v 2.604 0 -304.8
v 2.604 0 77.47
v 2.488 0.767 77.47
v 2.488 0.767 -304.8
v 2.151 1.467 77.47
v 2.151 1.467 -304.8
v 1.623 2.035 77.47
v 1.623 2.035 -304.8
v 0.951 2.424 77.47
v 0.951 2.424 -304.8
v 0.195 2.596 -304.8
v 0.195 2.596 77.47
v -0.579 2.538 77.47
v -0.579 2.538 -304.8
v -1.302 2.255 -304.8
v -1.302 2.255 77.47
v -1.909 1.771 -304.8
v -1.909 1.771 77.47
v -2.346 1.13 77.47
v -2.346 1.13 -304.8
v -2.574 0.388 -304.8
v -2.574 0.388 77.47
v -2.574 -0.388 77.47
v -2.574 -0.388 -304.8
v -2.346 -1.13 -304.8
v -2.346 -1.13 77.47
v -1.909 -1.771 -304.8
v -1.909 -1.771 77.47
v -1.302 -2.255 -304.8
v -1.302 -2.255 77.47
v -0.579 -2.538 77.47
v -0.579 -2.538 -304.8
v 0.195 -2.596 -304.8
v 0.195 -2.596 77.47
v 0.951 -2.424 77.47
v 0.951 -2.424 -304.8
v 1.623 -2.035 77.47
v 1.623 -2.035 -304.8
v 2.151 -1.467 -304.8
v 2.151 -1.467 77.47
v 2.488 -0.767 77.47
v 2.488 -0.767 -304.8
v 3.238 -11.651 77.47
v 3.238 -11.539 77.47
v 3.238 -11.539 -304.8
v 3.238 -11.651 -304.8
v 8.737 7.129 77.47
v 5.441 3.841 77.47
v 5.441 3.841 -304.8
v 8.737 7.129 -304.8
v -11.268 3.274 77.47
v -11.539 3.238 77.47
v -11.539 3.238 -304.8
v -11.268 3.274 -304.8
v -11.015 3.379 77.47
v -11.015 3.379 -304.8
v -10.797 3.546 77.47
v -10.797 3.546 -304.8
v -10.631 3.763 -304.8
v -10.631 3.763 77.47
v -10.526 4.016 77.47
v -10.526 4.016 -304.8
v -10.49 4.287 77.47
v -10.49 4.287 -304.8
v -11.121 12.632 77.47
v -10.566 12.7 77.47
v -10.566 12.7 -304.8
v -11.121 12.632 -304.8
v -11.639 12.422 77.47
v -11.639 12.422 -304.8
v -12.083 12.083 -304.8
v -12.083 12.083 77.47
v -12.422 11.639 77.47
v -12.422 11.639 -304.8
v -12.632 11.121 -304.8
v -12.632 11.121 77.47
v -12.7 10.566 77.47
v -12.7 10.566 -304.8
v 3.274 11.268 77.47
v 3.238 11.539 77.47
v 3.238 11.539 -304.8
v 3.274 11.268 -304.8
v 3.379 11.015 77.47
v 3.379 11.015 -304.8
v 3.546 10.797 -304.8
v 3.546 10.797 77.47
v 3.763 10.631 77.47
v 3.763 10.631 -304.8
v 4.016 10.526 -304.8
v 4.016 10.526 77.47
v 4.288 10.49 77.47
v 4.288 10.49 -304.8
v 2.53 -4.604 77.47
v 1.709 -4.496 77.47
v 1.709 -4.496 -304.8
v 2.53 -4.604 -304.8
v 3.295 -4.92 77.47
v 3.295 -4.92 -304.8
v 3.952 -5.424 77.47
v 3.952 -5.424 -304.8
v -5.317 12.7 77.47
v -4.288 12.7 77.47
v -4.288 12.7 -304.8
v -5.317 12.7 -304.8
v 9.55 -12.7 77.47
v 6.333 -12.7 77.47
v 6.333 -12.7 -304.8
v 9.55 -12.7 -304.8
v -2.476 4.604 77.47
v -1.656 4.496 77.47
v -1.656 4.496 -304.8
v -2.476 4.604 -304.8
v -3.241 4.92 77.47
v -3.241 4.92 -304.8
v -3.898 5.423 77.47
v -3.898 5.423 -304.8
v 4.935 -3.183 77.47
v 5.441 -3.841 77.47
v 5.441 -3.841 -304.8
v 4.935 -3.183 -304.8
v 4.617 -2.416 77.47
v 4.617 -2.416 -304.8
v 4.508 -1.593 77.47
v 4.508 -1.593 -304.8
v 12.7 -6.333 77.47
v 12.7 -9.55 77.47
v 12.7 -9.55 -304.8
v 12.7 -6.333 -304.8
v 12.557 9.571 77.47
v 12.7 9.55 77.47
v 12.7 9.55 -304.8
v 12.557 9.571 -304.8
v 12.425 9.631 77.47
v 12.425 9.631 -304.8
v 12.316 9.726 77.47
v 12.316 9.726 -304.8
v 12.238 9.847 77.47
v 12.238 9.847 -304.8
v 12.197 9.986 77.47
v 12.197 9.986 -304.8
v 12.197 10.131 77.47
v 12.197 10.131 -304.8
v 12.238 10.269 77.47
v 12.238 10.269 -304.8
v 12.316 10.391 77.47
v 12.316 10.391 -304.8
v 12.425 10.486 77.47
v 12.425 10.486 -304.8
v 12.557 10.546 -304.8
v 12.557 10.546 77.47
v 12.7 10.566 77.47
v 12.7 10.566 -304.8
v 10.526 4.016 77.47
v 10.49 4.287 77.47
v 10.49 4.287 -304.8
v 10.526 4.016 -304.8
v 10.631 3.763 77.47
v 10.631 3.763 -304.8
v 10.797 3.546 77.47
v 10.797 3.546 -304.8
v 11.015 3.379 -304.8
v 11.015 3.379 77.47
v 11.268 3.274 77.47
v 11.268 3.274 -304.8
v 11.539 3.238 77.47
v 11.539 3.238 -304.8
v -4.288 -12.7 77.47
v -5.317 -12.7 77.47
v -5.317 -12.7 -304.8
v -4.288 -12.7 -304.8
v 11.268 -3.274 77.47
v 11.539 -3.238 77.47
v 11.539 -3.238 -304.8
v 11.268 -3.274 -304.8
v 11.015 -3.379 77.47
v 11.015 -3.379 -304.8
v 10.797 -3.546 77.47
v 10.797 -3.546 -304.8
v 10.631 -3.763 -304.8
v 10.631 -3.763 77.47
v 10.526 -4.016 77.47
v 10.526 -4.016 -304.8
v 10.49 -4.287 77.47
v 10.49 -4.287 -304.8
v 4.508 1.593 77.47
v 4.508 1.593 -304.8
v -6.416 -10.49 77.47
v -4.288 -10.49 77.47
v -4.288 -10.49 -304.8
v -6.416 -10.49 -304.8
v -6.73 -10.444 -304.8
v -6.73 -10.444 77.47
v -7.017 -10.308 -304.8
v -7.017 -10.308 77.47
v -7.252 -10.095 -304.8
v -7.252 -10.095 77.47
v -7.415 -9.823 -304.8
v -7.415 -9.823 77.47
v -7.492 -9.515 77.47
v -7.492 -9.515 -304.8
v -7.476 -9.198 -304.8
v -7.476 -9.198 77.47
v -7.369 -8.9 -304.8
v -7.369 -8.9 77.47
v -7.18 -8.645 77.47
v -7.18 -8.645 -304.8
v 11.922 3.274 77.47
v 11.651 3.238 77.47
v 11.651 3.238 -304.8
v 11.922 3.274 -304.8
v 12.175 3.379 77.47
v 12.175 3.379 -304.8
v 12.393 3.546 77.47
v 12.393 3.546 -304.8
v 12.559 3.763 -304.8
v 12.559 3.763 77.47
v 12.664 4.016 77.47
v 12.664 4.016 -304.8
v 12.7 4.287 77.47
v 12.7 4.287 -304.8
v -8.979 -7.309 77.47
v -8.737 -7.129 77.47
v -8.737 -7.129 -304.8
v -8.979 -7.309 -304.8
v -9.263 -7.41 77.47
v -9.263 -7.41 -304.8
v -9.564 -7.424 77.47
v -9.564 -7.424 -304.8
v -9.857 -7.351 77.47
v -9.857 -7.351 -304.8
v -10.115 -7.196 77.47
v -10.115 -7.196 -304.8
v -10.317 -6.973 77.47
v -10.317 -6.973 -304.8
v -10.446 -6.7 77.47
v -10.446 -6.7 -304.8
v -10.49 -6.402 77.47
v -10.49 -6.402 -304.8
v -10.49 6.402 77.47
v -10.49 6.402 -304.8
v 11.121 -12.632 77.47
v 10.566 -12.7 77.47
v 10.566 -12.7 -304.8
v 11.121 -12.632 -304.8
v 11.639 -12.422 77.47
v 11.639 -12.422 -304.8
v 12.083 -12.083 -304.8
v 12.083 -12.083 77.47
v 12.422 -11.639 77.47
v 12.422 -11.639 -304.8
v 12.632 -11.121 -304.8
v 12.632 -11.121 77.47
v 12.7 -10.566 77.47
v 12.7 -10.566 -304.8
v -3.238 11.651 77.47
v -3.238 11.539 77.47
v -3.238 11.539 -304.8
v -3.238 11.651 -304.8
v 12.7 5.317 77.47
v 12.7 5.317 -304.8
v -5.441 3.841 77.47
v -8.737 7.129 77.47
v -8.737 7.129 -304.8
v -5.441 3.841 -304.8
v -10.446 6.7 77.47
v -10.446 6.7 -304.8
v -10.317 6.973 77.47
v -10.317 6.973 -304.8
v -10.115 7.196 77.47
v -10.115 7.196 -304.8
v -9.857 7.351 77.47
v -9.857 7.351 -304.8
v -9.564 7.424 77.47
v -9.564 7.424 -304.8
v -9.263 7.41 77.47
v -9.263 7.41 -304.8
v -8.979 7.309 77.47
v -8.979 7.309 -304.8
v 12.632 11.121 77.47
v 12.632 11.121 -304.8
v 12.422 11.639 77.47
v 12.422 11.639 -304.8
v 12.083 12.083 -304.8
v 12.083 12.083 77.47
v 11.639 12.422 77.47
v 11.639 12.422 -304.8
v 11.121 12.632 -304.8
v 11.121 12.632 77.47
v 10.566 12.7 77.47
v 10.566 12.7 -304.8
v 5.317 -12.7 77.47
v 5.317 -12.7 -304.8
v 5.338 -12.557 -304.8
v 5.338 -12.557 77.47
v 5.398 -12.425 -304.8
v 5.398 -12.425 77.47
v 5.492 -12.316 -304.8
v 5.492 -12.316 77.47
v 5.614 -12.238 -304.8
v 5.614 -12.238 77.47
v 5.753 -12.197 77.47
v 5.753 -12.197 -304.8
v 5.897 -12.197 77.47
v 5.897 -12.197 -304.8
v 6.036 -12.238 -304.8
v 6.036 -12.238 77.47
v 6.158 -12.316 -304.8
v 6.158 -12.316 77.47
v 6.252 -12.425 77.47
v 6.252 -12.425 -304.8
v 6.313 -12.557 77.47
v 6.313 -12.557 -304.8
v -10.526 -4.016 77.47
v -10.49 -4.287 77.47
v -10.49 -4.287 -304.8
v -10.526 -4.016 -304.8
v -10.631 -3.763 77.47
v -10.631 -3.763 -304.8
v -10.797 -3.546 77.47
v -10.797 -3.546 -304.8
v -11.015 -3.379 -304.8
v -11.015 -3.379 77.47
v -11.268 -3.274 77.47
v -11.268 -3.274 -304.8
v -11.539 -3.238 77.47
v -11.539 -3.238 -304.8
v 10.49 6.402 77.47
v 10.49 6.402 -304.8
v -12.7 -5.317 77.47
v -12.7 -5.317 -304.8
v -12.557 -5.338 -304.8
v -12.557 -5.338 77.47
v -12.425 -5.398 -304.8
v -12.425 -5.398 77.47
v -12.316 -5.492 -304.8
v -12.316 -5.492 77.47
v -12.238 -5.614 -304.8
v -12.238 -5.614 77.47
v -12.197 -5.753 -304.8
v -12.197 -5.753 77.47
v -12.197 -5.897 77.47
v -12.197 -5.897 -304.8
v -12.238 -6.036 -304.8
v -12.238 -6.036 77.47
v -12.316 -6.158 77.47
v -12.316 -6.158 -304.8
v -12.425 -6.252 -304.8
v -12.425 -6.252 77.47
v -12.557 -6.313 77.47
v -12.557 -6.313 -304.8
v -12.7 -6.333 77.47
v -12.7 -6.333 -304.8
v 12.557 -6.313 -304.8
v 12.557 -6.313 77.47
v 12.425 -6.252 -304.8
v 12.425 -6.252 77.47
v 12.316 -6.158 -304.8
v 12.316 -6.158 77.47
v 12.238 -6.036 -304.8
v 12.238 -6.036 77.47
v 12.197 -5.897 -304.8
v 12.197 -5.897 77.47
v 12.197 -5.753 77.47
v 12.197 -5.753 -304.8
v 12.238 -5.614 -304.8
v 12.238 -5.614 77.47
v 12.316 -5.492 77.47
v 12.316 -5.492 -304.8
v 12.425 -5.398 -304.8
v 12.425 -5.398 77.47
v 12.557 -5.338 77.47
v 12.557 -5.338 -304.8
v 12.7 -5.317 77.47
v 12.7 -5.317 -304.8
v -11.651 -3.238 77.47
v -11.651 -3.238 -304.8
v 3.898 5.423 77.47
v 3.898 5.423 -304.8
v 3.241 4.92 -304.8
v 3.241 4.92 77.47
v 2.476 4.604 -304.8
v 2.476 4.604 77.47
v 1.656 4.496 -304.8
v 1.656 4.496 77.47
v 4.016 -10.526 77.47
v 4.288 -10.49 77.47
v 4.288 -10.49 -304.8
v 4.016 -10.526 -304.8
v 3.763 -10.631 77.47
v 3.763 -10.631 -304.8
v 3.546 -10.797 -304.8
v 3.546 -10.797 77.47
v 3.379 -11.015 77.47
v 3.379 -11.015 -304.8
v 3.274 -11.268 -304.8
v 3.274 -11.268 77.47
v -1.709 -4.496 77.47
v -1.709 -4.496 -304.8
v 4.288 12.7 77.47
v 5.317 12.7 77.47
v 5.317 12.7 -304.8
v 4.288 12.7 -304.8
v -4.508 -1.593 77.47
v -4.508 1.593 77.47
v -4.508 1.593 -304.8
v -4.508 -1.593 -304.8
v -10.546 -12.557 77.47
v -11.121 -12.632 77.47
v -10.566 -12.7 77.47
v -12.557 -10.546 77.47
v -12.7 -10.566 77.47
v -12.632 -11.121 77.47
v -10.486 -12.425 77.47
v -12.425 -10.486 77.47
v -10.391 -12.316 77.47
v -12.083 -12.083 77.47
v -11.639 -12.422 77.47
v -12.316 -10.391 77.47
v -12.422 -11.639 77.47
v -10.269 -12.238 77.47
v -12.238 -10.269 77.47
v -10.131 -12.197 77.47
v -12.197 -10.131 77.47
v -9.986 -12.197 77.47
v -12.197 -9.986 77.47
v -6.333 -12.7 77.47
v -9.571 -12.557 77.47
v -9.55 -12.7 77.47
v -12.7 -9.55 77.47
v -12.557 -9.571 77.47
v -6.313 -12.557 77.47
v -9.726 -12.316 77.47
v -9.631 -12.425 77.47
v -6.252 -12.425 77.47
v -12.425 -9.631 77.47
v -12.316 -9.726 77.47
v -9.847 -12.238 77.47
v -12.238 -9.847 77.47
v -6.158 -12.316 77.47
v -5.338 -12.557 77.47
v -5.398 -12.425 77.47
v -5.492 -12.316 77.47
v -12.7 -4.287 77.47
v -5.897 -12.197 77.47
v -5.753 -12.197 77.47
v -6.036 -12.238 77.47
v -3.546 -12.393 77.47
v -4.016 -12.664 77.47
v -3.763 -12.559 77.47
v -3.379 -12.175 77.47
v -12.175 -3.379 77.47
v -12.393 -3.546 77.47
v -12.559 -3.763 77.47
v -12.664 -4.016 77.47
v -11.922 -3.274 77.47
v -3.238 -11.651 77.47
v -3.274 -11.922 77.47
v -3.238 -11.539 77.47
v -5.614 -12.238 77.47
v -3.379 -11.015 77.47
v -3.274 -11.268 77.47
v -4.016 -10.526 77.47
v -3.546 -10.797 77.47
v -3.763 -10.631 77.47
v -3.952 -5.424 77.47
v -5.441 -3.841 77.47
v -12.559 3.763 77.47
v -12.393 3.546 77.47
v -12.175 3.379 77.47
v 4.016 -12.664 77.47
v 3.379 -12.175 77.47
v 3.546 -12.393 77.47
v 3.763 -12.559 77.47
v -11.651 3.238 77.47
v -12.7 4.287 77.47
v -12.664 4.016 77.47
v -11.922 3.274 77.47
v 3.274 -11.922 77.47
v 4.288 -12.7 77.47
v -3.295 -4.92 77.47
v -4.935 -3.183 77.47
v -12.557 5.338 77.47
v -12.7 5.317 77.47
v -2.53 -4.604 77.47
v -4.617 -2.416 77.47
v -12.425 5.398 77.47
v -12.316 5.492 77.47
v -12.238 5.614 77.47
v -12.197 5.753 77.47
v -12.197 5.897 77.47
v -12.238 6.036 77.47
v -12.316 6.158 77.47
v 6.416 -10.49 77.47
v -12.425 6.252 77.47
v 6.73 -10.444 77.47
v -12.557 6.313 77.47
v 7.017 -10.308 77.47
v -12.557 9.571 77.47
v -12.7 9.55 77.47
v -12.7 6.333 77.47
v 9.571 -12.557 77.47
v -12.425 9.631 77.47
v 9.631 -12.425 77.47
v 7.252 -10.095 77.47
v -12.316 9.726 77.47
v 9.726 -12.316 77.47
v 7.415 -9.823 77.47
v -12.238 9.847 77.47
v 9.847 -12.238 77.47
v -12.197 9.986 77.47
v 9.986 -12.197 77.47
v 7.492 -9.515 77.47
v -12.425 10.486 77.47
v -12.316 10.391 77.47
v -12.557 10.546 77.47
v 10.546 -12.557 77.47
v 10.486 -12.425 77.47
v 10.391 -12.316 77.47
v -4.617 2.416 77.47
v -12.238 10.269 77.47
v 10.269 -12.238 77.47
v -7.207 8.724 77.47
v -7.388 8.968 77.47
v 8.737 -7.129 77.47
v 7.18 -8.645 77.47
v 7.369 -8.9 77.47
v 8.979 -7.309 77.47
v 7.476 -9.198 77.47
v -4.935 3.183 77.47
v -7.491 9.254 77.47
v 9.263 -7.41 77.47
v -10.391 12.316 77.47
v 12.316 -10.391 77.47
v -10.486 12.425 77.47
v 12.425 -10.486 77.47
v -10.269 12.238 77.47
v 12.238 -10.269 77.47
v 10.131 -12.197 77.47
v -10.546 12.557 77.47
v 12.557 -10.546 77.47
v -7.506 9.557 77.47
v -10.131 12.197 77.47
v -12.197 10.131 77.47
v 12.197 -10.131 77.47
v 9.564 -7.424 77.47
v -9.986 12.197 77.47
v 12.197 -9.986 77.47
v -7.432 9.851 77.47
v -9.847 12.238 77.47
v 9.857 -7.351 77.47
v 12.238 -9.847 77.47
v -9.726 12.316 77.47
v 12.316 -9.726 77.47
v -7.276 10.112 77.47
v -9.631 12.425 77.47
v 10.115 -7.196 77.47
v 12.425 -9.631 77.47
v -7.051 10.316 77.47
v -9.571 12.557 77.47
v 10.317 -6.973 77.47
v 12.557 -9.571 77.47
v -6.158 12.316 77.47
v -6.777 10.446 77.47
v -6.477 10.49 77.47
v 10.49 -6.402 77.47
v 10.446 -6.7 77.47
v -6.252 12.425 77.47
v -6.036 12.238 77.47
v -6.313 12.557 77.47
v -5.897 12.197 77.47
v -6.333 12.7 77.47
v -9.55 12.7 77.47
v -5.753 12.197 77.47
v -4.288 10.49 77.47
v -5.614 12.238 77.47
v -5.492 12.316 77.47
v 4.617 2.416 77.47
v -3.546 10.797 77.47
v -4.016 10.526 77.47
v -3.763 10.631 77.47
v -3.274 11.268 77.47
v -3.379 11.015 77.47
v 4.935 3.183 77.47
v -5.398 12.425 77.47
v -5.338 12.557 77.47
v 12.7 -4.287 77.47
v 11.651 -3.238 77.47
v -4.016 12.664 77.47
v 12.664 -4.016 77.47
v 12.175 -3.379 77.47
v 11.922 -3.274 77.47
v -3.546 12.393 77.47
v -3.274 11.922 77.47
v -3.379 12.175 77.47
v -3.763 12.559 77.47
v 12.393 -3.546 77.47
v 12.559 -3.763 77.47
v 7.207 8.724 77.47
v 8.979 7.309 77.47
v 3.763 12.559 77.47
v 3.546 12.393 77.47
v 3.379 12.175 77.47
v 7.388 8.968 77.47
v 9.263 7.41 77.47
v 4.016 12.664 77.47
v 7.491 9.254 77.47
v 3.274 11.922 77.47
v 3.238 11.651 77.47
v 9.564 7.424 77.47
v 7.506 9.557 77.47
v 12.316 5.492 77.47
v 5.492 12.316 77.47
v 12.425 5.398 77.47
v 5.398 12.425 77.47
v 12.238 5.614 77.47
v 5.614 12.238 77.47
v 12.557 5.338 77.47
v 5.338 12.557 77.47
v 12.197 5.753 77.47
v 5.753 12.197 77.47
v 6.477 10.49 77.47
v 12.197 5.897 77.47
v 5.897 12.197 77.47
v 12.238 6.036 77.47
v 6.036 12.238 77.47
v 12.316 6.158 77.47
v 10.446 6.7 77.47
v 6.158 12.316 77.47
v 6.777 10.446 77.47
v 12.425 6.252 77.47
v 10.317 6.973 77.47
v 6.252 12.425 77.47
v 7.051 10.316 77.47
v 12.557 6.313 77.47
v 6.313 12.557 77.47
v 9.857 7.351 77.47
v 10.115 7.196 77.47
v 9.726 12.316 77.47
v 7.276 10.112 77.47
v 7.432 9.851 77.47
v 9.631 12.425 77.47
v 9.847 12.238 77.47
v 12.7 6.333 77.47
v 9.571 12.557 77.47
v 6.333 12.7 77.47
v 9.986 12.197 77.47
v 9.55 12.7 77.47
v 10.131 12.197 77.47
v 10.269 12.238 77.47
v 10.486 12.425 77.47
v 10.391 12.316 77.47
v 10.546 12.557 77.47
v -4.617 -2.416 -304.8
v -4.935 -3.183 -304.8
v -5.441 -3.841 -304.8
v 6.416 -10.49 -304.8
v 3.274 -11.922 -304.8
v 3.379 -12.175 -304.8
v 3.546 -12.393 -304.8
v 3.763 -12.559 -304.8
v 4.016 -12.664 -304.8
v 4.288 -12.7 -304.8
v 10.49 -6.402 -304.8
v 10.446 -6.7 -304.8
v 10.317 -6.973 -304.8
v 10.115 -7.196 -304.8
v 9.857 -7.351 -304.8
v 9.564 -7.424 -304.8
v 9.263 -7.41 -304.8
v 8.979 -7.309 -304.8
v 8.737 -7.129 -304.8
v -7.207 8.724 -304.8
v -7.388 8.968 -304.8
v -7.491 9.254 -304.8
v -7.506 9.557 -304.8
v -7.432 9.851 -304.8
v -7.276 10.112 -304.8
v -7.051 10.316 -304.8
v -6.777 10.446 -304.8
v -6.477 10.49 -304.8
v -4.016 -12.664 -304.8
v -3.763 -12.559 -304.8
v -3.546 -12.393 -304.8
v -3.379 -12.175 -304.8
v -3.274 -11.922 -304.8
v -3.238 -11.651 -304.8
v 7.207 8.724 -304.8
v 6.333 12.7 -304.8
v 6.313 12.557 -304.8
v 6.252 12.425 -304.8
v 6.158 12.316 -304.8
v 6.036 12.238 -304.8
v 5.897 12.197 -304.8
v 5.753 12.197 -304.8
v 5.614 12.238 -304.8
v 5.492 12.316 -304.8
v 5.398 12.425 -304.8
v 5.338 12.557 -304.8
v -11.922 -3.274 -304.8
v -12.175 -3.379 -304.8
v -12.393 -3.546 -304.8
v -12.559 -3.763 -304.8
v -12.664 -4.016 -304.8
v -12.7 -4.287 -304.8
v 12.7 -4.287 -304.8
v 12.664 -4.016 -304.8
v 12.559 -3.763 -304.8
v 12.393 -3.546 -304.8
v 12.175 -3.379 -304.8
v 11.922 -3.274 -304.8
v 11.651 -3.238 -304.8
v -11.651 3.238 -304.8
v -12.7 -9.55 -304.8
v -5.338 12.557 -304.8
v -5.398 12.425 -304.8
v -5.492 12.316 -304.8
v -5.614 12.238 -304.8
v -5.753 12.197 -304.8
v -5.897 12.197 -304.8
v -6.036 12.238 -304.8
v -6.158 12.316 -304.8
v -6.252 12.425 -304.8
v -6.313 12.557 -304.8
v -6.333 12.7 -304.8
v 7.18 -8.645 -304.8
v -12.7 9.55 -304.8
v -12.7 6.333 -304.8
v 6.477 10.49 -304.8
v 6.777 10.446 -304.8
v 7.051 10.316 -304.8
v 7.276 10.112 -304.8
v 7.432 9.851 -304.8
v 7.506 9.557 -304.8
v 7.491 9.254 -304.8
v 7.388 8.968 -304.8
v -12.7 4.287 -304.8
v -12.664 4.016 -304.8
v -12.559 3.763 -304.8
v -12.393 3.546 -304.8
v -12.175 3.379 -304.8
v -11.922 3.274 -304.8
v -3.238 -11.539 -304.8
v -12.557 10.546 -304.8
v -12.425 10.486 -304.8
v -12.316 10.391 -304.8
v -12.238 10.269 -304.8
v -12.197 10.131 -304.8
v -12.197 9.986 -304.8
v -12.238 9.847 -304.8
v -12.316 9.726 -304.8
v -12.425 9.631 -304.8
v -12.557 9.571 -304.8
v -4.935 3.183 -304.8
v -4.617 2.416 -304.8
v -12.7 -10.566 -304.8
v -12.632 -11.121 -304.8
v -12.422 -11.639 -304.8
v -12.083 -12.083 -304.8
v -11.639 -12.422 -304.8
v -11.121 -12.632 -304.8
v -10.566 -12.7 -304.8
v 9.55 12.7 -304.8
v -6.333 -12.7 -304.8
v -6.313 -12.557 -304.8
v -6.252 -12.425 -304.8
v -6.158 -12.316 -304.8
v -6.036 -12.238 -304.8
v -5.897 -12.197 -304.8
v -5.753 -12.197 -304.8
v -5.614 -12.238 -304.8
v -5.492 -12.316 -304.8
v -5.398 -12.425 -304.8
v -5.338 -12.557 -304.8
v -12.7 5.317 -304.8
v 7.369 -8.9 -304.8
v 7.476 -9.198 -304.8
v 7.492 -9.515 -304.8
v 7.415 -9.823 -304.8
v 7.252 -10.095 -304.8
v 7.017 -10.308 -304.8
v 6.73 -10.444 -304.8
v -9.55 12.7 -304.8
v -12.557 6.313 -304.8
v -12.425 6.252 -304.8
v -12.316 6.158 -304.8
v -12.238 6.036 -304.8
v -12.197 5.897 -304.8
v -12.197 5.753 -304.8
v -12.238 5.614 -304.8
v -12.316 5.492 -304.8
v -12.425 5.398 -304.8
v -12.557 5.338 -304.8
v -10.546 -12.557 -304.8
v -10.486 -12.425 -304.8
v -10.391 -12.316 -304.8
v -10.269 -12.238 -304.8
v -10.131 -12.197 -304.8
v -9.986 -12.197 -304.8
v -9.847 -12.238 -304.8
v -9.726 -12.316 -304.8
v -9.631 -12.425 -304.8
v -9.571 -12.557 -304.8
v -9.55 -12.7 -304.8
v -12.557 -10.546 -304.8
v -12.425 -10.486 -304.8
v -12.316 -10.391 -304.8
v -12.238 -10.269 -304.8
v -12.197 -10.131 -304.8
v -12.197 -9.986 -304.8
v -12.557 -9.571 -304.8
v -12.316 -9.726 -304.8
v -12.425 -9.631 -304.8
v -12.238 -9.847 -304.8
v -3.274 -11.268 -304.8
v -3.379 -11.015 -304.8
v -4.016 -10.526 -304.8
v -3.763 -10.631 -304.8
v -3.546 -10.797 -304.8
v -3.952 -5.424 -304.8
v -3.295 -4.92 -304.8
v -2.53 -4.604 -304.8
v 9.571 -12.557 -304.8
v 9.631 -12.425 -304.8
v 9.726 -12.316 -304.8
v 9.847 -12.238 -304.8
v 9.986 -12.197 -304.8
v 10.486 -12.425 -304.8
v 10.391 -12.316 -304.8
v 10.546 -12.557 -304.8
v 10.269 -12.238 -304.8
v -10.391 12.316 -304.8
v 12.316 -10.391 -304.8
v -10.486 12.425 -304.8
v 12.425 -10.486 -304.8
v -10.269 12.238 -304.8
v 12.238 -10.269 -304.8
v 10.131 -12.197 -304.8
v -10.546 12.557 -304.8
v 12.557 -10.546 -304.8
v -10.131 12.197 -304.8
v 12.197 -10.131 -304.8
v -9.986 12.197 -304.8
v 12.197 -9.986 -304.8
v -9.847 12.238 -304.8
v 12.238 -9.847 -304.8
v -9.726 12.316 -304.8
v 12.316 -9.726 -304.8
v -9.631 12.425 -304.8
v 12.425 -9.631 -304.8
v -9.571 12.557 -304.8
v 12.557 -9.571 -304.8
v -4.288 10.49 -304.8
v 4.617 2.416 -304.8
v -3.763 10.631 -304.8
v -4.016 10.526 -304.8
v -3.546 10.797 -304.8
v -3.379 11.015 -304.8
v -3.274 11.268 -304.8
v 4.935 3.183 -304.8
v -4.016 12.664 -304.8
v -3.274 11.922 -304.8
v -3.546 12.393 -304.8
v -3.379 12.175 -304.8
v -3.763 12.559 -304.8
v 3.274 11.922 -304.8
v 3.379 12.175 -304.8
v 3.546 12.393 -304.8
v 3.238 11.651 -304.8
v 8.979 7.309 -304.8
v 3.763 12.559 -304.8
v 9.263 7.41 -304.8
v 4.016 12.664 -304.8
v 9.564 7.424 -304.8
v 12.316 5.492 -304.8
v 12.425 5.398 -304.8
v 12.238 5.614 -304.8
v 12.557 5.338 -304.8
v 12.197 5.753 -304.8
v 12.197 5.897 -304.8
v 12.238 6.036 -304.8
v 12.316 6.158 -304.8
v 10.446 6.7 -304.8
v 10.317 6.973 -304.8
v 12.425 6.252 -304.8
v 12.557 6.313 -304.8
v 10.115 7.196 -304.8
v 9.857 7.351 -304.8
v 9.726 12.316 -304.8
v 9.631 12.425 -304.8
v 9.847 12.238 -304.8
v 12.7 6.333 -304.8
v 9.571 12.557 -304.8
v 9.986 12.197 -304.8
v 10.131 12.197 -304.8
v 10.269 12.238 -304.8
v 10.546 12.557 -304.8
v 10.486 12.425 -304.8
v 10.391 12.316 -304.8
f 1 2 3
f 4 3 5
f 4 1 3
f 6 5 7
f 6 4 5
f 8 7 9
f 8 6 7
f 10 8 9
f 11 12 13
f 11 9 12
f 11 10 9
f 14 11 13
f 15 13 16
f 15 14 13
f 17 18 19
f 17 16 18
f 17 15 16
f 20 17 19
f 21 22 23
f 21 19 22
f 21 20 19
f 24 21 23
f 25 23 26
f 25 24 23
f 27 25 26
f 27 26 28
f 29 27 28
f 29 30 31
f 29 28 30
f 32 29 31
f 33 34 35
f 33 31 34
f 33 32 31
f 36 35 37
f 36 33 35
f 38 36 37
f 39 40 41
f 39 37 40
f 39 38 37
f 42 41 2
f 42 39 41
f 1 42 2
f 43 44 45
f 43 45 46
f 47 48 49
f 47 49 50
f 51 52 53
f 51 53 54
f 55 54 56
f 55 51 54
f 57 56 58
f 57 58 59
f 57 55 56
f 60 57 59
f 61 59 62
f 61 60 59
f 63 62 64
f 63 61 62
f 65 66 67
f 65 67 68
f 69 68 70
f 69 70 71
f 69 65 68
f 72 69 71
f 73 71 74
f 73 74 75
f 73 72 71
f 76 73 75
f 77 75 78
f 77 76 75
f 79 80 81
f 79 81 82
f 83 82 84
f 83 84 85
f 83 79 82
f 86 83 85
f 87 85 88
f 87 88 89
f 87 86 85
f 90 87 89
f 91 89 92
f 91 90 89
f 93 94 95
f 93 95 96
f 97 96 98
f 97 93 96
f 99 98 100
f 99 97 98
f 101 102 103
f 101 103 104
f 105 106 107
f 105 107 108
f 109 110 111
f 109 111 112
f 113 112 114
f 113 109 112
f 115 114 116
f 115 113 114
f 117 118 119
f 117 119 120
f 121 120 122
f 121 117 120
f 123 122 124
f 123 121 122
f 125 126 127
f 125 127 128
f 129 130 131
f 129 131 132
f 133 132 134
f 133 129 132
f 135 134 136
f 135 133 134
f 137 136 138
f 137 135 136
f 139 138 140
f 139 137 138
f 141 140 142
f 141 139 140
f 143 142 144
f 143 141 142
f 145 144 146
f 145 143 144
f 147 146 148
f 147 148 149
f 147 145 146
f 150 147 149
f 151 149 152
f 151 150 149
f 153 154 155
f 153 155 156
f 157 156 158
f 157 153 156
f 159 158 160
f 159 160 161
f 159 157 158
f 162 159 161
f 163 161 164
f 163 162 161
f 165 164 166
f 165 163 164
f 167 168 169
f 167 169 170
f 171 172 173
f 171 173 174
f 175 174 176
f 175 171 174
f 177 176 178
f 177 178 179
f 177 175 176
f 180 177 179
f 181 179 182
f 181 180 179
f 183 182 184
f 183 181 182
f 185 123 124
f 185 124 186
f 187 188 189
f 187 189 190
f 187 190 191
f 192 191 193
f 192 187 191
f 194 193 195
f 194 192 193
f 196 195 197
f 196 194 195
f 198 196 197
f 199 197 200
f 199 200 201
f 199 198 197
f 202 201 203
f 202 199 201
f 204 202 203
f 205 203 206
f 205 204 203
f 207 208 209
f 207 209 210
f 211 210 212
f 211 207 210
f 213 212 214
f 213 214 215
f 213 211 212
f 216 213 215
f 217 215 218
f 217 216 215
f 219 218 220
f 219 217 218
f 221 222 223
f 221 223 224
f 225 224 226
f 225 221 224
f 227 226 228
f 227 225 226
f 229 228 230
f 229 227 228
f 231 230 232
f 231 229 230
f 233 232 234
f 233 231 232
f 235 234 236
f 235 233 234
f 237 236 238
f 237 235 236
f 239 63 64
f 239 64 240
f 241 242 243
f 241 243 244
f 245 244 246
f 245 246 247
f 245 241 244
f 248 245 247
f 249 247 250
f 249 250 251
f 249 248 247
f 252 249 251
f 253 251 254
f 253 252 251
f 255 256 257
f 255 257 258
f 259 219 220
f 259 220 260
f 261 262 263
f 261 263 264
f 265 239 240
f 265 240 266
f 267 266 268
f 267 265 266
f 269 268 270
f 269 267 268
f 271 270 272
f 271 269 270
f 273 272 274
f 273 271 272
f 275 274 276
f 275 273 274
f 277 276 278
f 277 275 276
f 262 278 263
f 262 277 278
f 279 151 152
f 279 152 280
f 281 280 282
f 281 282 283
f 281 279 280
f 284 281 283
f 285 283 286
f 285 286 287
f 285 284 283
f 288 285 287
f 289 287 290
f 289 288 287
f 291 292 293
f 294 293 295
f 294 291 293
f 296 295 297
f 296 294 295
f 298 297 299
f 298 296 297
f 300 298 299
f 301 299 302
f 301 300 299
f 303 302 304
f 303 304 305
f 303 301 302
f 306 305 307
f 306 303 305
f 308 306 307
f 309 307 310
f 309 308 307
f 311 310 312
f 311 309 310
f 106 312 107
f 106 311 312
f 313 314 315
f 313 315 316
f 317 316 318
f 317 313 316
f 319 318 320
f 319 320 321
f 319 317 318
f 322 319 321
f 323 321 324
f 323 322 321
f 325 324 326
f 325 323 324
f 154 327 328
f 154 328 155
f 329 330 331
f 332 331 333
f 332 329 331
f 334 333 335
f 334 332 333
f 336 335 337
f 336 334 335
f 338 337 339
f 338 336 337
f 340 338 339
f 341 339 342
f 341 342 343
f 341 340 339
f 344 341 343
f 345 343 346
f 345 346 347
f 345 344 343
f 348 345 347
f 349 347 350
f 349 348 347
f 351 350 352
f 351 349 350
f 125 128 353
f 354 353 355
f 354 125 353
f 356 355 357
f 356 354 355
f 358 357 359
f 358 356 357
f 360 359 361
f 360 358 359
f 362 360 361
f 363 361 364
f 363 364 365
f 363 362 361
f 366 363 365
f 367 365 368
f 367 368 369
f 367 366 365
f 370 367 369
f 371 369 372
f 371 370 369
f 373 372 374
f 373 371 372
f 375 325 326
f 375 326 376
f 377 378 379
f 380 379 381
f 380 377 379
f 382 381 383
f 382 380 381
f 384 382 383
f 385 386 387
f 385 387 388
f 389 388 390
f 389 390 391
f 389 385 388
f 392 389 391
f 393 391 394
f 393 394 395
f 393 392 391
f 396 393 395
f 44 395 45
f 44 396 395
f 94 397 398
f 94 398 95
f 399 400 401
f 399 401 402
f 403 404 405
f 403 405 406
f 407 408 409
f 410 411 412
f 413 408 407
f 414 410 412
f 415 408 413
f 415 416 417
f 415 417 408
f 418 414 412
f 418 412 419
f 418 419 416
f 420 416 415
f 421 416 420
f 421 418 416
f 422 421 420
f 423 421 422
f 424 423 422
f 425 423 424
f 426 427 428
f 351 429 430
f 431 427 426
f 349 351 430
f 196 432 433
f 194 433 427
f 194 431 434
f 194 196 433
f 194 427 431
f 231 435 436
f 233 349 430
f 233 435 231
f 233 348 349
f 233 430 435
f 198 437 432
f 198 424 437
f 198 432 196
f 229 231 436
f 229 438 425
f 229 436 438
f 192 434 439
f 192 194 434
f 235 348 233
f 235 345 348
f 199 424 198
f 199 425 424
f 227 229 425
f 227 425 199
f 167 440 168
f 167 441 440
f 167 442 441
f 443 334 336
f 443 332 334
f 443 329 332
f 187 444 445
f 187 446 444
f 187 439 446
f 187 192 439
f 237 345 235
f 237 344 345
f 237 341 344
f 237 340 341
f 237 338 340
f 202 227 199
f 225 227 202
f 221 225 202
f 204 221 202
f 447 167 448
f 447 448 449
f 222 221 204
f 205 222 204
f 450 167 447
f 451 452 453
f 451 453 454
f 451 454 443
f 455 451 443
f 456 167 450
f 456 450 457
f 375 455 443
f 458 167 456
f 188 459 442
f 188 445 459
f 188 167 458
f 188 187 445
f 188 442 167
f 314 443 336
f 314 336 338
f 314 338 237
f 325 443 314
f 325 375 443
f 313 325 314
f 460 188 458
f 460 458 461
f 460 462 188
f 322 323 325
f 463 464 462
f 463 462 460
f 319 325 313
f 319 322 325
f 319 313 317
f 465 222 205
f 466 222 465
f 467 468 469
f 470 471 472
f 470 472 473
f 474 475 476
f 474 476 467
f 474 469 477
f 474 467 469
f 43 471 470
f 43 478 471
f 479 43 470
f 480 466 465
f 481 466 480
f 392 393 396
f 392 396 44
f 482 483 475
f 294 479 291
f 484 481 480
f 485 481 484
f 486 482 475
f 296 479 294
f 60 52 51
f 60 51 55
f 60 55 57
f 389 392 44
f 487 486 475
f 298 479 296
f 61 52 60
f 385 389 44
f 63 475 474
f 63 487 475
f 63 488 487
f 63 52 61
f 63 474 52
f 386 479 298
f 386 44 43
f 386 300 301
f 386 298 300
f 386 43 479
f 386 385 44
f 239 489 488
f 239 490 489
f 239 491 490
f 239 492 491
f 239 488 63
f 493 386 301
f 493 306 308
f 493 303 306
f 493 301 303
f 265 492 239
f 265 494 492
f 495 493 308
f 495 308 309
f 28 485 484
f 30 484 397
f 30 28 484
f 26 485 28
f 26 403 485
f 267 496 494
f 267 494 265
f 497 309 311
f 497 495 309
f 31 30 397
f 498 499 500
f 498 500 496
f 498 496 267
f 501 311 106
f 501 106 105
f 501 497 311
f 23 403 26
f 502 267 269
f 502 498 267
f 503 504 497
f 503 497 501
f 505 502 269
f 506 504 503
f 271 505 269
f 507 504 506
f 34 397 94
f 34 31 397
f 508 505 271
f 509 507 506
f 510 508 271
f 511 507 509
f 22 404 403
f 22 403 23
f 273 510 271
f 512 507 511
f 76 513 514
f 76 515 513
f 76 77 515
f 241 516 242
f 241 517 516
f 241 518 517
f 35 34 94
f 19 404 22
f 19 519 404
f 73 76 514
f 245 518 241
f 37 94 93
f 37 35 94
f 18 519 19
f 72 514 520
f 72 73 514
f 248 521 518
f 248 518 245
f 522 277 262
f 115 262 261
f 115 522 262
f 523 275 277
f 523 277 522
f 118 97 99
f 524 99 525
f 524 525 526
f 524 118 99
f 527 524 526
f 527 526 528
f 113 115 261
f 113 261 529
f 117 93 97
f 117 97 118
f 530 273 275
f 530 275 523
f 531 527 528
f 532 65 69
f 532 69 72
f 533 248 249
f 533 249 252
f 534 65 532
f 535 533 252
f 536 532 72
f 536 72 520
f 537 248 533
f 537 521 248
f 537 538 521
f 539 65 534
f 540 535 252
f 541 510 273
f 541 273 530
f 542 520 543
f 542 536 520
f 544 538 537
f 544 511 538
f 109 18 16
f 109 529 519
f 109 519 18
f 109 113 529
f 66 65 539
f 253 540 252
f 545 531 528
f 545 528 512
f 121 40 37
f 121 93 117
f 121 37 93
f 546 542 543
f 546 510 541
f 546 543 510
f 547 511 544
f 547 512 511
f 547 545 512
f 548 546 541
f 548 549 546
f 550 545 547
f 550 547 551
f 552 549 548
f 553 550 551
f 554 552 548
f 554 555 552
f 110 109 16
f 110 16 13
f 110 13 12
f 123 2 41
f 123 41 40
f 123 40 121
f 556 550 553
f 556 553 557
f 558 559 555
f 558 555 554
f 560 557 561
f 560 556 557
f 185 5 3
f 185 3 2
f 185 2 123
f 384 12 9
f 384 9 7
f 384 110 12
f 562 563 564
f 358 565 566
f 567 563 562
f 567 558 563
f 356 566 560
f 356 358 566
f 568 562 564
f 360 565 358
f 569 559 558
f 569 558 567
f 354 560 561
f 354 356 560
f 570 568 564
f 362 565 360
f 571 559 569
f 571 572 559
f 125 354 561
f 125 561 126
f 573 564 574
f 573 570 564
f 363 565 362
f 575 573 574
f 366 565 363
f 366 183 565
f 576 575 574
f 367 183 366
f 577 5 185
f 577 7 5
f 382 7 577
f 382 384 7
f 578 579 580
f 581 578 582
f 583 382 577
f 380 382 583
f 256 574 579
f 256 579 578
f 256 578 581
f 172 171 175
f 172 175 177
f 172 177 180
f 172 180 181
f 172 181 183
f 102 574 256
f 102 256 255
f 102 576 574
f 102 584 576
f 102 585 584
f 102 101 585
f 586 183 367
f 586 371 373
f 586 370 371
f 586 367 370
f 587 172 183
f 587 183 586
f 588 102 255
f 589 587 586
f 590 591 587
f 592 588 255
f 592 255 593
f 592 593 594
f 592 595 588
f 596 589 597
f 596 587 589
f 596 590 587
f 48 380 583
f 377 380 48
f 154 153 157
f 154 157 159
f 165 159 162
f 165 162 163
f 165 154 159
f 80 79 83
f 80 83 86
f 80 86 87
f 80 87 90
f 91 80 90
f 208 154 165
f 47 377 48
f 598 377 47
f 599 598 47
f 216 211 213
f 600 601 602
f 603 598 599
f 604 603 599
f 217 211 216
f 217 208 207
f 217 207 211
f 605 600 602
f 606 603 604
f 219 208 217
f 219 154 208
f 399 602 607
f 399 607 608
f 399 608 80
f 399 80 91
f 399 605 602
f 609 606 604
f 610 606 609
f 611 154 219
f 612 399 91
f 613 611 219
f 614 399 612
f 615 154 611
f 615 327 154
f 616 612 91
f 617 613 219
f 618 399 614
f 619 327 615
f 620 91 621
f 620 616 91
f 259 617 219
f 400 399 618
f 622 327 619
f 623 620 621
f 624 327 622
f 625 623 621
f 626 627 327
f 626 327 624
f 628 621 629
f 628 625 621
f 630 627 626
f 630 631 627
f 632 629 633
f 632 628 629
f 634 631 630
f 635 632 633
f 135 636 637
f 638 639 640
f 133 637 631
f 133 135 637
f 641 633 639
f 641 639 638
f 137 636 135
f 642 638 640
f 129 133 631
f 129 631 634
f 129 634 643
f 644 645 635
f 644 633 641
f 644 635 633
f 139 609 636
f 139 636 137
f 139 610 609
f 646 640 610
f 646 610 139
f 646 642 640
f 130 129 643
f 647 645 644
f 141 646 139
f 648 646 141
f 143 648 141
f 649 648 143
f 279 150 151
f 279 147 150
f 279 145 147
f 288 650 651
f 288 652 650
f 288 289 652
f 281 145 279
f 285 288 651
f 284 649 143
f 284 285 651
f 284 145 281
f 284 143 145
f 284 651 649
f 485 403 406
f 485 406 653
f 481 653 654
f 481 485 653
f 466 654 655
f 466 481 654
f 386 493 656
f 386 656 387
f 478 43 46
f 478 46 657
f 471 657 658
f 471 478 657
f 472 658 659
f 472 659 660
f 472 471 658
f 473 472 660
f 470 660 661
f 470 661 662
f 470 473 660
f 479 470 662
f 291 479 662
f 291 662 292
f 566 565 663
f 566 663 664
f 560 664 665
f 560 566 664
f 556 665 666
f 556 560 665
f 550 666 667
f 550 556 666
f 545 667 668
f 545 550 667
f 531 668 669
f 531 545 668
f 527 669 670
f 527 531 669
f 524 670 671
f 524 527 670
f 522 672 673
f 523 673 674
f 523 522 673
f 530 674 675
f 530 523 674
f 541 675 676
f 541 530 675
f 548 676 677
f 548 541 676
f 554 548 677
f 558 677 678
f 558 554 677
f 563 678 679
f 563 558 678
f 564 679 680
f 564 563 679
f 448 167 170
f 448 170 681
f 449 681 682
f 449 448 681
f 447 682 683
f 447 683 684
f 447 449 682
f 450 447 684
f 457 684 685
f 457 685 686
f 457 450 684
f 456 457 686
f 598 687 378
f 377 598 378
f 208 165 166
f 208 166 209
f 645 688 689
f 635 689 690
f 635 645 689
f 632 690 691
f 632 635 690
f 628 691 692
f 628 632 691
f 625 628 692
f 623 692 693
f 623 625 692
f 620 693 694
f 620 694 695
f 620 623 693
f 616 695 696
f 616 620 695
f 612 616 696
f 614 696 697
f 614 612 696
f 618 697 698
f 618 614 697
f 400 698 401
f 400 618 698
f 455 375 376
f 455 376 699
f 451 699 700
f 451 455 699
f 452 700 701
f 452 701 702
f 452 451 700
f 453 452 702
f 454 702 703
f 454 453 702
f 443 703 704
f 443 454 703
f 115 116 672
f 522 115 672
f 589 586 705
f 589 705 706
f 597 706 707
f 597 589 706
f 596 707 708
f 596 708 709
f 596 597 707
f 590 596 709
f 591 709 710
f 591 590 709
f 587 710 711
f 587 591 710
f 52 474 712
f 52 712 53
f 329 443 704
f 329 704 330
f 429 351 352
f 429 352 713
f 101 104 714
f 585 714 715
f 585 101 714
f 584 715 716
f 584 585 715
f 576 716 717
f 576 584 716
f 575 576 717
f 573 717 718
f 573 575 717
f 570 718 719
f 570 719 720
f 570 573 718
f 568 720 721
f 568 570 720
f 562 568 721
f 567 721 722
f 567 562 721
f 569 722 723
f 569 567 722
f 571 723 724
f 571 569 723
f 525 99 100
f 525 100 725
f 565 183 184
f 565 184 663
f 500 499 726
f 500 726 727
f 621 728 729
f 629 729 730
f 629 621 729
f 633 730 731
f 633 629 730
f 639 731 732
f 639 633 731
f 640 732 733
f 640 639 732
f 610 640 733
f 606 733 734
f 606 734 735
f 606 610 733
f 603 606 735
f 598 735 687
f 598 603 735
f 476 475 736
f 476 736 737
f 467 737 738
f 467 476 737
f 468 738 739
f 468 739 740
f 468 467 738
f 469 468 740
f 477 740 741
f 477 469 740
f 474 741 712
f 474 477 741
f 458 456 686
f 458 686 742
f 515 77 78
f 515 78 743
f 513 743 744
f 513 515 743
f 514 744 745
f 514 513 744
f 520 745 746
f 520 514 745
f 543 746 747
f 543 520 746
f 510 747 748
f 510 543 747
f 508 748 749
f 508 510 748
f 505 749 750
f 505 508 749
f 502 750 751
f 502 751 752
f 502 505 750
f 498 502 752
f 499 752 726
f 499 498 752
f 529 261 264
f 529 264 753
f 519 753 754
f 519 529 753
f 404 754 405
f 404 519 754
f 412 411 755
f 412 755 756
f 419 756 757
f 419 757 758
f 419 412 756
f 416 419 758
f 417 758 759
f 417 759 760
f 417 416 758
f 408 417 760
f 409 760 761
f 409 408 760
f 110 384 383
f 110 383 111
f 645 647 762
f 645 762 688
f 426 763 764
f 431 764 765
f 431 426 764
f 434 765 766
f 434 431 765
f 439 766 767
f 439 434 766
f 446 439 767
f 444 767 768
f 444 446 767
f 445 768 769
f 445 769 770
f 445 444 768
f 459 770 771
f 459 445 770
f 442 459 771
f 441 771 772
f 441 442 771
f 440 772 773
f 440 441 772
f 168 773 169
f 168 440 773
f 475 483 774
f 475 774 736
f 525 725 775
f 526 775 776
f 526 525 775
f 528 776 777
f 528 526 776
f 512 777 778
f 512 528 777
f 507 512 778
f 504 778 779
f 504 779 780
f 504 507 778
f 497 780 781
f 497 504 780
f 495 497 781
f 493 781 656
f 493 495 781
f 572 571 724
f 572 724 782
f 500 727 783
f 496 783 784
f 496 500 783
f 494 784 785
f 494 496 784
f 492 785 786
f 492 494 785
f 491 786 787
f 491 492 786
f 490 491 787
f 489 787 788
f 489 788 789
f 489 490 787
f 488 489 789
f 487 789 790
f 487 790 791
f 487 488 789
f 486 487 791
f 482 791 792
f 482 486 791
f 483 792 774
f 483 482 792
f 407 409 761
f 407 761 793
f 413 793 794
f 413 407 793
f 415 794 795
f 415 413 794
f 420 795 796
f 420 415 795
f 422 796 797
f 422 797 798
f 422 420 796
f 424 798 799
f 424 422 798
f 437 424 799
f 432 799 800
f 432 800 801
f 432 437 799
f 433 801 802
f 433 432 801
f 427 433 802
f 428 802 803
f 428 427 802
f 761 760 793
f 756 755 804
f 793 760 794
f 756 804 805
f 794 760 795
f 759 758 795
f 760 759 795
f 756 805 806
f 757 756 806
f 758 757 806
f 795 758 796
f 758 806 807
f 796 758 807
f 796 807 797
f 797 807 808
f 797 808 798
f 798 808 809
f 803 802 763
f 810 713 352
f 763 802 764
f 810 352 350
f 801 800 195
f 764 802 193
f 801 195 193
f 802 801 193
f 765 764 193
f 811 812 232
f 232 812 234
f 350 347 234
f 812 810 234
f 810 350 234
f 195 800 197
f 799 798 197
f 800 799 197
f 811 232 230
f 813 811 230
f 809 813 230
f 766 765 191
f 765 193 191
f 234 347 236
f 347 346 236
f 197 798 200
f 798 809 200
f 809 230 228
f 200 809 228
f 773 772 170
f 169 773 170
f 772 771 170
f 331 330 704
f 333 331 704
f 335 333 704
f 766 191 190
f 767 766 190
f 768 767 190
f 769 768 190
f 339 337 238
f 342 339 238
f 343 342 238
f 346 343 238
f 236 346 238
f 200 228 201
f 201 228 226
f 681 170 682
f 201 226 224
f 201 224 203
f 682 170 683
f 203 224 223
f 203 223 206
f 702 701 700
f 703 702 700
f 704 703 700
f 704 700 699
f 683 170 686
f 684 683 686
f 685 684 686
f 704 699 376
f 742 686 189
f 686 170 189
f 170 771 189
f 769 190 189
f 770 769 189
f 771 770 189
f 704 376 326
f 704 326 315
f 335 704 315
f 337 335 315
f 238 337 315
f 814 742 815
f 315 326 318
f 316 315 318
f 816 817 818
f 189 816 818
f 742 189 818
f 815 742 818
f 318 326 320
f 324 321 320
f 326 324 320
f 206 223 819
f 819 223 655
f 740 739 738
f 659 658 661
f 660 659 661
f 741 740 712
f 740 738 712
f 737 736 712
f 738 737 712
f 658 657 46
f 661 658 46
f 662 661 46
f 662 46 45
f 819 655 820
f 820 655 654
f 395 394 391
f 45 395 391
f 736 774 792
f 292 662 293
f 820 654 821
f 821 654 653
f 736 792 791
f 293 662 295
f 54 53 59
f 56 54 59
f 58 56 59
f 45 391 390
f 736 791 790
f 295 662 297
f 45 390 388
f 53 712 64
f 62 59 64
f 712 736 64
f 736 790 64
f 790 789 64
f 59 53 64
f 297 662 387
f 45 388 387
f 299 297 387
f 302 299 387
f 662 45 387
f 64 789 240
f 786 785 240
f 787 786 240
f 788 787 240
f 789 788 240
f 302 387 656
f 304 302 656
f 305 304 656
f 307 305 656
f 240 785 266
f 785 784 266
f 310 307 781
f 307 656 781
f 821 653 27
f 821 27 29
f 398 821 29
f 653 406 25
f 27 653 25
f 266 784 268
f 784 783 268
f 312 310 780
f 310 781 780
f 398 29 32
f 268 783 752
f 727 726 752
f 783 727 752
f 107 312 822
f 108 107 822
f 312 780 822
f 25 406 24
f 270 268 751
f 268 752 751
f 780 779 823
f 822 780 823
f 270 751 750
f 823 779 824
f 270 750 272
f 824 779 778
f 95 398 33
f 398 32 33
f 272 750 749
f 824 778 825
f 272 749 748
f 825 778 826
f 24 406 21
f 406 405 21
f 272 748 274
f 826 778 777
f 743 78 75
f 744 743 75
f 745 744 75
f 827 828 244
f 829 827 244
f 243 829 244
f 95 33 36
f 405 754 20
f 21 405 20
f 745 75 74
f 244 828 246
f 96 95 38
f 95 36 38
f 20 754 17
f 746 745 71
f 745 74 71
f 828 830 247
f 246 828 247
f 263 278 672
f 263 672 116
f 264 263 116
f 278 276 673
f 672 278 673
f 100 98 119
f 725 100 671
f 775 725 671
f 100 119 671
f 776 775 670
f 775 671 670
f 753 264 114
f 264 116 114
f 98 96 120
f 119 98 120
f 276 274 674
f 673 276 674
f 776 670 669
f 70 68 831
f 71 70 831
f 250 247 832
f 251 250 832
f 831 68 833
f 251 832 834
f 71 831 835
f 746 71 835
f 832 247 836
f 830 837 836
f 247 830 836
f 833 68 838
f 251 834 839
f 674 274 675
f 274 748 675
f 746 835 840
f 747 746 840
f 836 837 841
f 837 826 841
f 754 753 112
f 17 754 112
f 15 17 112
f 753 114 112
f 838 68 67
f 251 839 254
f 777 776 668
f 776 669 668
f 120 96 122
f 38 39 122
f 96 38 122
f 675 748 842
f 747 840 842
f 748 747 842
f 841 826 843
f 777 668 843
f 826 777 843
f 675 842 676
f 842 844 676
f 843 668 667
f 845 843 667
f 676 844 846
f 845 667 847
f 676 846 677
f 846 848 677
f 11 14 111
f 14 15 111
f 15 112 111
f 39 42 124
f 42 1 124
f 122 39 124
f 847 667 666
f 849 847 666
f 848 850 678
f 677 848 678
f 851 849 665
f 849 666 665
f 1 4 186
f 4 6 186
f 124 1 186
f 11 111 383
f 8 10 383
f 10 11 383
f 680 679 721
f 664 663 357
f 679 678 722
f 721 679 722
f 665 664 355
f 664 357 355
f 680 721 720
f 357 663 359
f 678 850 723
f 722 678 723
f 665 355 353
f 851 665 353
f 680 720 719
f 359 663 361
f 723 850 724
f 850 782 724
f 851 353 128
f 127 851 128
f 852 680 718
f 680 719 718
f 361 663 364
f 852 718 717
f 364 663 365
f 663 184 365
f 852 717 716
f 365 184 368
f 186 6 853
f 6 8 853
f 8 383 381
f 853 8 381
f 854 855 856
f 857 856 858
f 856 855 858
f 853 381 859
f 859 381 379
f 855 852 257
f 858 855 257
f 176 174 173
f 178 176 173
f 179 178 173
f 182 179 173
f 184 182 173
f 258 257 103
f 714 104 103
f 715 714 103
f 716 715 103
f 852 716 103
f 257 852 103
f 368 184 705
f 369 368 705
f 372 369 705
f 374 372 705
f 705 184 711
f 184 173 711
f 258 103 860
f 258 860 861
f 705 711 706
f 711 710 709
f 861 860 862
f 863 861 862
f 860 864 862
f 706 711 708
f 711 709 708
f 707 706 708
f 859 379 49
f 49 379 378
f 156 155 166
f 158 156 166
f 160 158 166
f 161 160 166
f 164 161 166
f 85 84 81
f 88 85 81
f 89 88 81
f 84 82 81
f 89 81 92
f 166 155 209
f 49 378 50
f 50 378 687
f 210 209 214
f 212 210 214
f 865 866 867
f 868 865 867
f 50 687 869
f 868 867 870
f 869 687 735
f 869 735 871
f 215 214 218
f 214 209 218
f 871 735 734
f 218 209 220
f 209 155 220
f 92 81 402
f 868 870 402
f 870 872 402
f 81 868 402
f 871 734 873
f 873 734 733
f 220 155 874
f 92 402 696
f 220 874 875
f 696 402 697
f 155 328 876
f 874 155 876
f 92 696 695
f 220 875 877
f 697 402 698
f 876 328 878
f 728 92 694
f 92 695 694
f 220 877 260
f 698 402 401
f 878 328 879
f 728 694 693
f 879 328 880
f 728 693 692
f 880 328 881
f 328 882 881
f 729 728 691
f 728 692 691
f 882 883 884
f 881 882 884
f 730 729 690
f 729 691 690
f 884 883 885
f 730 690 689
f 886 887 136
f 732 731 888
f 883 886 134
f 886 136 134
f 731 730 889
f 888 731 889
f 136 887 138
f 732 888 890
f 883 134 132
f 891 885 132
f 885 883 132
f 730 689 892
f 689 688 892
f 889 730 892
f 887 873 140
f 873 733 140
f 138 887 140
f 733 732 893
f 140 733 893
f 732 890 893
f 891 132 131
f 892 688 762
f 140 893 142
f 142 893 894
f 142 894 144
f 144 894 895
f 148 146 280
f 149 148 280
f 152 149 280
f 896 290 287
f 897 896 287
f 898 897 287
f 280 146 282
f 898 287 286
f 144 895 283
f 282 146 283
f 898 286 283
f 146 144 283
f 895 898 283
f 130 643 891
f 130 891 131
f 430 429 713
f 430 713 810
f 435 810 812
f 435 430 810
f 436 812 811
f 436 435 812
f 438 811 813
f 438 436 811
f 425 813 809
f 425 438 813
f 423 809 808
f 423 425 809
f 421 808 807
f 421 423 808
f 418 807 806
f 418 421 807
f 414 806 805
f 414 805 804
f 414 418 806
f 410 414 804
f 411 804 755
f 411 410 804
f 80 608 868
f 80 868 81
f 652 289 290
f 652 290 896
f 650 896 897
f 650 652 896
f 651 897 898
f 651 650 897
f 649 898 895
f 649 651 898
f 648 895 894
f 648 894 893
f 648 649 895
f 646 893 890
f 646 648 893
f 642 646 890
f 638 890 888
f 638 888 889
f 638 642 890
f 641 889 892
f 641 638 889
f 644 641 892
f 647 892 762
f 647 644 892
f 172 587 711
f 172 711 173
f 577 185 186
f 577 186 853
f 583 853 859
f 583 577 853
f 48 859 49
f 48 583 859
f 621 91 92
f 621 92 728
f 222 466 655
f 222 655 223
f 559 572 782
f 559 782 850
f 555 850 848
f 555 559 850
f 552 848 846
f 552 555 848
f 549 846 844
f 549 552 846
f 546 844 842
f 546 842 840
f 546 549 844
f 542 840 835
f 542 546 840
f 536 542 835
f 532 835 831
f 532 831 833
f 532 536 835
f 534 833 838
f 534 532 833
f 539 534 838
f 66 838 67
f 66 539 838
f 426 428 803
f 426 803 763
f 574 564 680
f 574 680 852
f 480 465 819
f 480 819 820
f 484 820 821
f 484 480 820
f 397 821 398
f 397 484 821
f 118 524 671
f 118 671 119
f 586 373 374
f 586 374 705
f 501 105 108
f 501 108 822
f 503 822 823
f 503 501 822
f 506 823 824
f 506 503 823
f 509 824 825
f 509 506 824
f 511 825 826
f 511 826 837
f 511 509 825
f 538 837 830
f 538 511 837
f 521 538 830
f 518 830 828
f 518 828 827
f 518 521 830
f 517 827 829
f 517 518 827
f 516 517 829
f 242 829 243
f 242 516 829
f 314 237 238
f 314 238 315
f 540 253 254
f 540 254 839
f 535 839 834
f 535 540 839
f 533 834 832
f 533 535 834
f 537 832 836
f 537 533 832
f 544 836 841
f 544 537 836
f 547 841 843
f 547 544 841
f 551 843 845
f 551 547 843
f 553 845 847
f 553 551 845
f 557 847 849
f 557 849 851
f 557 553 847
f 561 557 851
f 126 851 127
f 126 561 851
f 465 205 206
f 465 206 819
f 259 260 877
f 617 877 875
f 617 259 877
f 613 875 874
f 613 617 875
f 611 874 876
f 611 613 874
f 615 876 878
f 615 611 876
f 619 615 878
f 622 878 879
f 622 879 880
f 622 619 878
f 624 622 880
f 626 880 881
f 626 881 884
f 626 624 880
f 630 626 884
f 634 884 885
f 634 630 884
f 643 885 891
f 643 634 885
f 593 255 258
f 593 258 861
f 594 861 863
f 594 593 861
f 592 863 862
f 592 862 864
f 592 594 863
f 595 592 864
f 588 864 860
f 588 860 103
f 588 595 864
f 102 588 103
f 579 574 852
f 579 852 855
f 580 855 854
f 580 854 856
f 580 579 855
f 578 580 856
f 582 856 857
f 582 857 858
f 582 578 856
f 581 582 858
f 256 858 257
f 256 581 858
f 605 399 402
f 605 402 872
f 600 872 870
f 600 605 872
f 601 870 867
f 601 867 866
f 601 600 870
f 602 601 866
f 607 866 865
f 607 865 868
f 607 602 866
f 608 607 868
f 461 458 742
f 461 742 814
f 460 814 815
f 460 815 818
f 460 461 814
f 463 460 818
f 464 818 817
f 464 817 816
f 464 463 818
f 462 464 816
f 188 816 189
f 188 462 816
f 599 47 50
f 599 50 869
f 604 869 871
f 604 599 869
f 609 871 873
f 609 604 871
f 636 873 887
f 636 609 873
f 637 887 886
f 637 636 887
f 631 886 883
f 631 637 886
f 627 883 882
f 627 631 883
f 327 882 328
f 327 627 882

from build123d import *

# Parameters (mm, degrees)
SKETCH1_R           = 2.6035
BOSS_EXTRUDE1_DEPTH = 304.8
SKETCH2_W           = 33.577347781
SKETCH2_H           = 32.744851555
CUT_EXTRUDE1_DEPTH  = 227.33


with BuildPart() as part:
    # Sketch1 → Boss-Extrude1 (new body, symmetric)
    with BuildSketch(Plane.XY):
        with BuildLine():
            Line((-7.179650497, -8.645192506), (-3.952270251, -5.423690499))
            ThreePointArc((-3.952270251, -5.423690499), (-2.922936451, -4.736929036), (-1.709253557, -4.4958))
            Line((-1.709253557, -4.4958), (1.709253557, -4.4958))
            ThreePointArc((1.709253557, -4.4958), (2.922936451, -4.736929036), (3.952270251, -5.423690499))
            Line((3.952270251, -5.423690499), (7.179650497, -8.645192506))
            ThreePointArc((7.179650497, -8.645192506), (7.41473083, -9.822813117), (6.416408329, -10.4902))
            Line((6.416408329, -10.4902), (4.287512407, -10.4902))
            ThreePointArc((4.287512407, -10.4902), (3.54574862, -10.79744862), (3.2385, -11.539212407))
            Line((3.2385, -11.539212407), (3.2385, -11.650987593))
            ThreePointArc((3.2385, -11.650987593), (3.54574862, -12.39275138), (4.287512407, -12.7))
            Line((4.287512407, -12.7), (5.317126718, -12.7))
            ThreePointArc((5.317126718, -12.7), (5.825126718, -12.192), (6.333126718, -12.7))
            Line((6.333126718, -12.7), (9.550443118, -12.7))
            ThreePointArc((9.550443118, -12.7), (10.058366869, -12.192000006), (10.566443095, -12.699847501))
            ThreePointArc((10.566443095, -12.699847501), (12.082537762, -12.08250727), (12.699846982, -10.566399977))
            ThreePointArc((12.699846982, -10.566399977), (12.192000006, -10.058323491), (12.7, -9.5504))
            Line((12.7, -9.5504), (12.7, -6.3330836))
            ThreePointArc((12.7, -6.3330836), (12.192, -5.8250836), (12.7, -5.3170836))
            Line((12.7, -5.3170836), (12.7, -4.287469289))
            ThreePointArc((12.7, -4.287469289), (12.39275138, -3.545705502), (11.650987593, -3.238456882))
            Line((11.650987593, -3.238456882), (11.539212407, -3.238456882))
            ThreePointArc((11.539212407, -3.238456882), (10.79744862, -3.545705502), (10.4902, -4.287469289))
            Line((10.4902, -4.287469289), (10.4902, -6.402089023))
            ThreePointArc((10.4902, -6.402089023), (9.856505071, -7.351067942), (8.737131347, -7.129408934))
            Line((8.737131347, -7.129408934), (5.441005833, -3.840816462))
            ThreePointArc((5.441005833, -3.840816462), (4.750877967, -2.809883091), (4.5085, -1.593185507))
            Line((4.5085, -1.593185507), (4.5085, 1.593185507))
            ThreePointArc((4.5085, 1.593185507), (4.750877967, 2.809883091), (5.441005833, 3.840816462))
            Line((5.441005833, 3.840816462), (8.737131347, 7.129408934))
            ThreePointArc((8.737131347, 7.129408934), (9.856505071, 7.351067942), (10.4902, 6.402089023))
            Line((10.4902, 6.402089023), (10.4902, 4.287469289))
            ThreePointArc((10.4902, 4.287469289), (10.79744862, 3.545705502), (11.539212407, 3.238456882))
            Line((11.539212407, 3.238456882), (11.650987593, 3.238456882))
            ThreePointArc((11.650987593, 3.238456882), (12.39275138, 3.545705502), (12.7, 4.287469289))
            Line((12.7, 4.287469289), (12.7, 5.3170836))
            ThreePointArc((12.7, 5.3170836), (12.192, 5.8250836), (12.7, 6.3330836))
            Line((12.7, 6.3330836), (12.7, 9.5504))
            ThreePointArc((12.7, 9.5504), (12.192000006, 10.058323491), (12.699846982, 10.566399977))
            ThreePointArc((12.699846982, 10.566399977), (12.082537762, 12.08250727), (10.566443095, 12.699847501))
            ThreePointArc((10.566443095, 12.699847501), (10.058366869, 12.192000006), (9.550443118, 12.7))
            Line((9.550443118, 12.7), (6.333126718, 12.7))
            ThreePointArc((6.333126718, 12.7), (5.825126718, 12.192), (5.317126718, 12.7))
            Line((5.317126718, 12.7), (4.287512407, 12.7))
            ThreePointArc((4.287512407, 12.7), (3.54574862, 12.39275138), (3.2385, 11.650987593))
            Line((3.2385, 11.650987593), (3.2385, 11.539212407))
            ThreePointArc((3.2385, 11.539212407), (3.54574862, 10.79744862), (4.287512407, 10.4902))
            Line((4.287512407, 10.4902), (6.476788598, 10.4902))
            ThreePointArc((6.476788598, 10.4902), (7.432222385, 9.85140422), (7.207036008, 8.724370562))
            Line((7.207036008, 8.724370562), (3.898272566, 5.423169045))
            ThreePointArc((3.898272566, 5.423169045), (2.869120213, 4.736787962), (1.655778399, 4.4958))
            Line((1.655778399, 4.4958), (-1.655778399, 4.4958))
            ThreePointArc((-1.655778399, 4.4958), (-2.869120213, 4.736787962), (-3.898272566, 5.423169045))
            Line((-3.898272566, 5.423169045), (-7.207036008, 8.724370562))
            ThreePointArc((-7.207036008, 8.724370562), (-7.432222385, 9.85140422), (-6.476788598, 10.4902))
            Line((-6.476788598, 10.4902), (-4.287512407, 10.4902))
            ThreePointArc((-4.287512407, 10.4902), (-3.54574862, 10.79744862), (-3.2385, 11.539212407))
            Line((-3.2385, 11.539212407), (-3.2385, 11.650987593))
            ThreePointArc((-3.2385, 11.650987593), (-3.54574862, 12.39275138), (-4.287512407, 12.7))
            Line((-4.287512407, 12.7), (-5.317126718, 12.7))
            ThreePointArc((-5.317126718, 12.7), (-5.825126718, 12.192), (-6.333126718, 12.7))
            Line((-6.333126718, 12.7), (-9.550443118, 12.7))
            ThreePointArc((-9.550443118, 12.7), (-10.058366869, 12.192000006), (-10.566443095, 12.699847501))
            ThreePointArc((-10.566443095, 12.699847501), (-12.082537762, 12.08250727), (-12.699846982, 10.566399977))
            ThreePointArc((-12.699846982, 10.566399977), (-12.192000006, 10.058323491), (-12.7, 9.5504))
            Line((-12.7, 9.5504), (-12.7, 6.3330836))
            ThreePointArc((-12.7, 6.3330836), (-12.192, 5.8250836), (-12.7, 5.3170836))
            Line((-12.7, 5.3170836), (-12.7, 4.287469289))
            ThreePointArc((-12.7, 4.287469289), (-12.39275138, 3.545705502), (-11.650987593, 3.238456882))
            Line((-11.650987593, 3.238456882), (-11.539212407, 3.238456882))
            ThreePointArc((-11.539212407, 3.238456882), (-10.79744862, 3.545705502), (-10.4902, 4.287469289))
            Line((-10.4902, 4.287469289), (-10.4902, 6.402089023))
            ThreePointArc((-10.4902, 6.402089023), (-9.856505071, 7.351067942), (-8.737131347, 7.129408934))
            Line((-8.737131347, 7.129408934), (-5.441005833, 3.840816462))
            ThreePointArc((-5.441005833, 3.840816462), (-4.750877967, 2.809883091), (-4.5085, 1.593185507))
            Line((-4.5085, 1.593185507), (-4.5085, -1.593185507))
            ThreePointArc((-4.5085, -1.593185507), (-4.750877967, -2.809883091), (-5.441005833, -3.840816462))
            Line((-5.441005833, -3.840816462), (-8.737131347, -7.129408934))
            ThreePointArc((-8.737131347, -7.129408934), (-9.856505071, -7.351067942), (-10.4902, -6.402089023))
            Line((-10.4902, -6.402089023), (-10.4902, -4.287469289))
            ThreePointArc((-10.4902, -4.287469289), (-10.79744862, -3.545705502), (-11.539212407, -3.238456882))
            Line((-11.539212407, -3.238456882), (-11.650987593, -3.238456882))
            ThreePointArc((-11.650987593, -3.238456882), (-12.39275138, -3.545705502), (-12.7, -4.287469289))
            Line((-12.7, -4.287469289), (-12.7, -5.3170836))
            ThreePointArc((-12.7, -5.3170836), (-12.192, -5.8250836), (-12.7, -6.3330836))
            Line((-12.7, -6.3330836), (-12.7, -9.5504))
            ThreePointArc((-12.7, -9.5504), (-12.192000006, -10.058323491), (-12.699846982, -10.566399977))
            ThreePointArc((-12.699846982, -10.566399977), (-12.082537762, -12.08250727), (-10.566443095, -12.699847501))
            ThreePointArc((-10.566443095, -12.699847501), (-10.058366869, -12.192000006), (-9.550443118, -12.7))
            Line((-9.550443118, -12.7), (-6.333126718, -12.7))
            ThreePointArc((-6.333126718, -12.7), (-5.825126718, -12.192), (-5.317126718, -12.7))
            Line((-5.317126718, -12.7), (-4.287512407, -12.7))
            ThreePointArc((-4.287512407, -12.7), (-3.54574862, -12.39275138), (-3.2385, -11.650987593))
            Line((-3.2385, -11.650987593), (-3.2385, -11.539212407))
            ThreePointArc((-3.2385, -11.539212407), (-3.54574862, -10.79744862), (-4.287512407, -10.4902))
            Line((-4.287512407, -10.4902), (-6.416408329, -10.4902))
            ThreePointArc((-6.416408329, -10.4902), (-7.41473083, -9.822813117), (-7.179650497, -8.645192506))
        make_face()
        Circle(SKETCH1_R, mode=Mode.SUBTRACT)
    extrude(amount=BOSS_EXTRUDE1_DEPTH, both=True)

    # Sketch2 → Cut-Extrude1 (cut)
    with BuildSketch(Plane.XY.offset(304.8)):
        with Locations((0.601247275, -1.572492872)):
            Rectangle(SKETCH2_W, SKETCH2_H)
    extrude(amount=-CUT_EXTRUDE1_DEPTH, mode=Mode.SUBTRACT)


solid = part.part
